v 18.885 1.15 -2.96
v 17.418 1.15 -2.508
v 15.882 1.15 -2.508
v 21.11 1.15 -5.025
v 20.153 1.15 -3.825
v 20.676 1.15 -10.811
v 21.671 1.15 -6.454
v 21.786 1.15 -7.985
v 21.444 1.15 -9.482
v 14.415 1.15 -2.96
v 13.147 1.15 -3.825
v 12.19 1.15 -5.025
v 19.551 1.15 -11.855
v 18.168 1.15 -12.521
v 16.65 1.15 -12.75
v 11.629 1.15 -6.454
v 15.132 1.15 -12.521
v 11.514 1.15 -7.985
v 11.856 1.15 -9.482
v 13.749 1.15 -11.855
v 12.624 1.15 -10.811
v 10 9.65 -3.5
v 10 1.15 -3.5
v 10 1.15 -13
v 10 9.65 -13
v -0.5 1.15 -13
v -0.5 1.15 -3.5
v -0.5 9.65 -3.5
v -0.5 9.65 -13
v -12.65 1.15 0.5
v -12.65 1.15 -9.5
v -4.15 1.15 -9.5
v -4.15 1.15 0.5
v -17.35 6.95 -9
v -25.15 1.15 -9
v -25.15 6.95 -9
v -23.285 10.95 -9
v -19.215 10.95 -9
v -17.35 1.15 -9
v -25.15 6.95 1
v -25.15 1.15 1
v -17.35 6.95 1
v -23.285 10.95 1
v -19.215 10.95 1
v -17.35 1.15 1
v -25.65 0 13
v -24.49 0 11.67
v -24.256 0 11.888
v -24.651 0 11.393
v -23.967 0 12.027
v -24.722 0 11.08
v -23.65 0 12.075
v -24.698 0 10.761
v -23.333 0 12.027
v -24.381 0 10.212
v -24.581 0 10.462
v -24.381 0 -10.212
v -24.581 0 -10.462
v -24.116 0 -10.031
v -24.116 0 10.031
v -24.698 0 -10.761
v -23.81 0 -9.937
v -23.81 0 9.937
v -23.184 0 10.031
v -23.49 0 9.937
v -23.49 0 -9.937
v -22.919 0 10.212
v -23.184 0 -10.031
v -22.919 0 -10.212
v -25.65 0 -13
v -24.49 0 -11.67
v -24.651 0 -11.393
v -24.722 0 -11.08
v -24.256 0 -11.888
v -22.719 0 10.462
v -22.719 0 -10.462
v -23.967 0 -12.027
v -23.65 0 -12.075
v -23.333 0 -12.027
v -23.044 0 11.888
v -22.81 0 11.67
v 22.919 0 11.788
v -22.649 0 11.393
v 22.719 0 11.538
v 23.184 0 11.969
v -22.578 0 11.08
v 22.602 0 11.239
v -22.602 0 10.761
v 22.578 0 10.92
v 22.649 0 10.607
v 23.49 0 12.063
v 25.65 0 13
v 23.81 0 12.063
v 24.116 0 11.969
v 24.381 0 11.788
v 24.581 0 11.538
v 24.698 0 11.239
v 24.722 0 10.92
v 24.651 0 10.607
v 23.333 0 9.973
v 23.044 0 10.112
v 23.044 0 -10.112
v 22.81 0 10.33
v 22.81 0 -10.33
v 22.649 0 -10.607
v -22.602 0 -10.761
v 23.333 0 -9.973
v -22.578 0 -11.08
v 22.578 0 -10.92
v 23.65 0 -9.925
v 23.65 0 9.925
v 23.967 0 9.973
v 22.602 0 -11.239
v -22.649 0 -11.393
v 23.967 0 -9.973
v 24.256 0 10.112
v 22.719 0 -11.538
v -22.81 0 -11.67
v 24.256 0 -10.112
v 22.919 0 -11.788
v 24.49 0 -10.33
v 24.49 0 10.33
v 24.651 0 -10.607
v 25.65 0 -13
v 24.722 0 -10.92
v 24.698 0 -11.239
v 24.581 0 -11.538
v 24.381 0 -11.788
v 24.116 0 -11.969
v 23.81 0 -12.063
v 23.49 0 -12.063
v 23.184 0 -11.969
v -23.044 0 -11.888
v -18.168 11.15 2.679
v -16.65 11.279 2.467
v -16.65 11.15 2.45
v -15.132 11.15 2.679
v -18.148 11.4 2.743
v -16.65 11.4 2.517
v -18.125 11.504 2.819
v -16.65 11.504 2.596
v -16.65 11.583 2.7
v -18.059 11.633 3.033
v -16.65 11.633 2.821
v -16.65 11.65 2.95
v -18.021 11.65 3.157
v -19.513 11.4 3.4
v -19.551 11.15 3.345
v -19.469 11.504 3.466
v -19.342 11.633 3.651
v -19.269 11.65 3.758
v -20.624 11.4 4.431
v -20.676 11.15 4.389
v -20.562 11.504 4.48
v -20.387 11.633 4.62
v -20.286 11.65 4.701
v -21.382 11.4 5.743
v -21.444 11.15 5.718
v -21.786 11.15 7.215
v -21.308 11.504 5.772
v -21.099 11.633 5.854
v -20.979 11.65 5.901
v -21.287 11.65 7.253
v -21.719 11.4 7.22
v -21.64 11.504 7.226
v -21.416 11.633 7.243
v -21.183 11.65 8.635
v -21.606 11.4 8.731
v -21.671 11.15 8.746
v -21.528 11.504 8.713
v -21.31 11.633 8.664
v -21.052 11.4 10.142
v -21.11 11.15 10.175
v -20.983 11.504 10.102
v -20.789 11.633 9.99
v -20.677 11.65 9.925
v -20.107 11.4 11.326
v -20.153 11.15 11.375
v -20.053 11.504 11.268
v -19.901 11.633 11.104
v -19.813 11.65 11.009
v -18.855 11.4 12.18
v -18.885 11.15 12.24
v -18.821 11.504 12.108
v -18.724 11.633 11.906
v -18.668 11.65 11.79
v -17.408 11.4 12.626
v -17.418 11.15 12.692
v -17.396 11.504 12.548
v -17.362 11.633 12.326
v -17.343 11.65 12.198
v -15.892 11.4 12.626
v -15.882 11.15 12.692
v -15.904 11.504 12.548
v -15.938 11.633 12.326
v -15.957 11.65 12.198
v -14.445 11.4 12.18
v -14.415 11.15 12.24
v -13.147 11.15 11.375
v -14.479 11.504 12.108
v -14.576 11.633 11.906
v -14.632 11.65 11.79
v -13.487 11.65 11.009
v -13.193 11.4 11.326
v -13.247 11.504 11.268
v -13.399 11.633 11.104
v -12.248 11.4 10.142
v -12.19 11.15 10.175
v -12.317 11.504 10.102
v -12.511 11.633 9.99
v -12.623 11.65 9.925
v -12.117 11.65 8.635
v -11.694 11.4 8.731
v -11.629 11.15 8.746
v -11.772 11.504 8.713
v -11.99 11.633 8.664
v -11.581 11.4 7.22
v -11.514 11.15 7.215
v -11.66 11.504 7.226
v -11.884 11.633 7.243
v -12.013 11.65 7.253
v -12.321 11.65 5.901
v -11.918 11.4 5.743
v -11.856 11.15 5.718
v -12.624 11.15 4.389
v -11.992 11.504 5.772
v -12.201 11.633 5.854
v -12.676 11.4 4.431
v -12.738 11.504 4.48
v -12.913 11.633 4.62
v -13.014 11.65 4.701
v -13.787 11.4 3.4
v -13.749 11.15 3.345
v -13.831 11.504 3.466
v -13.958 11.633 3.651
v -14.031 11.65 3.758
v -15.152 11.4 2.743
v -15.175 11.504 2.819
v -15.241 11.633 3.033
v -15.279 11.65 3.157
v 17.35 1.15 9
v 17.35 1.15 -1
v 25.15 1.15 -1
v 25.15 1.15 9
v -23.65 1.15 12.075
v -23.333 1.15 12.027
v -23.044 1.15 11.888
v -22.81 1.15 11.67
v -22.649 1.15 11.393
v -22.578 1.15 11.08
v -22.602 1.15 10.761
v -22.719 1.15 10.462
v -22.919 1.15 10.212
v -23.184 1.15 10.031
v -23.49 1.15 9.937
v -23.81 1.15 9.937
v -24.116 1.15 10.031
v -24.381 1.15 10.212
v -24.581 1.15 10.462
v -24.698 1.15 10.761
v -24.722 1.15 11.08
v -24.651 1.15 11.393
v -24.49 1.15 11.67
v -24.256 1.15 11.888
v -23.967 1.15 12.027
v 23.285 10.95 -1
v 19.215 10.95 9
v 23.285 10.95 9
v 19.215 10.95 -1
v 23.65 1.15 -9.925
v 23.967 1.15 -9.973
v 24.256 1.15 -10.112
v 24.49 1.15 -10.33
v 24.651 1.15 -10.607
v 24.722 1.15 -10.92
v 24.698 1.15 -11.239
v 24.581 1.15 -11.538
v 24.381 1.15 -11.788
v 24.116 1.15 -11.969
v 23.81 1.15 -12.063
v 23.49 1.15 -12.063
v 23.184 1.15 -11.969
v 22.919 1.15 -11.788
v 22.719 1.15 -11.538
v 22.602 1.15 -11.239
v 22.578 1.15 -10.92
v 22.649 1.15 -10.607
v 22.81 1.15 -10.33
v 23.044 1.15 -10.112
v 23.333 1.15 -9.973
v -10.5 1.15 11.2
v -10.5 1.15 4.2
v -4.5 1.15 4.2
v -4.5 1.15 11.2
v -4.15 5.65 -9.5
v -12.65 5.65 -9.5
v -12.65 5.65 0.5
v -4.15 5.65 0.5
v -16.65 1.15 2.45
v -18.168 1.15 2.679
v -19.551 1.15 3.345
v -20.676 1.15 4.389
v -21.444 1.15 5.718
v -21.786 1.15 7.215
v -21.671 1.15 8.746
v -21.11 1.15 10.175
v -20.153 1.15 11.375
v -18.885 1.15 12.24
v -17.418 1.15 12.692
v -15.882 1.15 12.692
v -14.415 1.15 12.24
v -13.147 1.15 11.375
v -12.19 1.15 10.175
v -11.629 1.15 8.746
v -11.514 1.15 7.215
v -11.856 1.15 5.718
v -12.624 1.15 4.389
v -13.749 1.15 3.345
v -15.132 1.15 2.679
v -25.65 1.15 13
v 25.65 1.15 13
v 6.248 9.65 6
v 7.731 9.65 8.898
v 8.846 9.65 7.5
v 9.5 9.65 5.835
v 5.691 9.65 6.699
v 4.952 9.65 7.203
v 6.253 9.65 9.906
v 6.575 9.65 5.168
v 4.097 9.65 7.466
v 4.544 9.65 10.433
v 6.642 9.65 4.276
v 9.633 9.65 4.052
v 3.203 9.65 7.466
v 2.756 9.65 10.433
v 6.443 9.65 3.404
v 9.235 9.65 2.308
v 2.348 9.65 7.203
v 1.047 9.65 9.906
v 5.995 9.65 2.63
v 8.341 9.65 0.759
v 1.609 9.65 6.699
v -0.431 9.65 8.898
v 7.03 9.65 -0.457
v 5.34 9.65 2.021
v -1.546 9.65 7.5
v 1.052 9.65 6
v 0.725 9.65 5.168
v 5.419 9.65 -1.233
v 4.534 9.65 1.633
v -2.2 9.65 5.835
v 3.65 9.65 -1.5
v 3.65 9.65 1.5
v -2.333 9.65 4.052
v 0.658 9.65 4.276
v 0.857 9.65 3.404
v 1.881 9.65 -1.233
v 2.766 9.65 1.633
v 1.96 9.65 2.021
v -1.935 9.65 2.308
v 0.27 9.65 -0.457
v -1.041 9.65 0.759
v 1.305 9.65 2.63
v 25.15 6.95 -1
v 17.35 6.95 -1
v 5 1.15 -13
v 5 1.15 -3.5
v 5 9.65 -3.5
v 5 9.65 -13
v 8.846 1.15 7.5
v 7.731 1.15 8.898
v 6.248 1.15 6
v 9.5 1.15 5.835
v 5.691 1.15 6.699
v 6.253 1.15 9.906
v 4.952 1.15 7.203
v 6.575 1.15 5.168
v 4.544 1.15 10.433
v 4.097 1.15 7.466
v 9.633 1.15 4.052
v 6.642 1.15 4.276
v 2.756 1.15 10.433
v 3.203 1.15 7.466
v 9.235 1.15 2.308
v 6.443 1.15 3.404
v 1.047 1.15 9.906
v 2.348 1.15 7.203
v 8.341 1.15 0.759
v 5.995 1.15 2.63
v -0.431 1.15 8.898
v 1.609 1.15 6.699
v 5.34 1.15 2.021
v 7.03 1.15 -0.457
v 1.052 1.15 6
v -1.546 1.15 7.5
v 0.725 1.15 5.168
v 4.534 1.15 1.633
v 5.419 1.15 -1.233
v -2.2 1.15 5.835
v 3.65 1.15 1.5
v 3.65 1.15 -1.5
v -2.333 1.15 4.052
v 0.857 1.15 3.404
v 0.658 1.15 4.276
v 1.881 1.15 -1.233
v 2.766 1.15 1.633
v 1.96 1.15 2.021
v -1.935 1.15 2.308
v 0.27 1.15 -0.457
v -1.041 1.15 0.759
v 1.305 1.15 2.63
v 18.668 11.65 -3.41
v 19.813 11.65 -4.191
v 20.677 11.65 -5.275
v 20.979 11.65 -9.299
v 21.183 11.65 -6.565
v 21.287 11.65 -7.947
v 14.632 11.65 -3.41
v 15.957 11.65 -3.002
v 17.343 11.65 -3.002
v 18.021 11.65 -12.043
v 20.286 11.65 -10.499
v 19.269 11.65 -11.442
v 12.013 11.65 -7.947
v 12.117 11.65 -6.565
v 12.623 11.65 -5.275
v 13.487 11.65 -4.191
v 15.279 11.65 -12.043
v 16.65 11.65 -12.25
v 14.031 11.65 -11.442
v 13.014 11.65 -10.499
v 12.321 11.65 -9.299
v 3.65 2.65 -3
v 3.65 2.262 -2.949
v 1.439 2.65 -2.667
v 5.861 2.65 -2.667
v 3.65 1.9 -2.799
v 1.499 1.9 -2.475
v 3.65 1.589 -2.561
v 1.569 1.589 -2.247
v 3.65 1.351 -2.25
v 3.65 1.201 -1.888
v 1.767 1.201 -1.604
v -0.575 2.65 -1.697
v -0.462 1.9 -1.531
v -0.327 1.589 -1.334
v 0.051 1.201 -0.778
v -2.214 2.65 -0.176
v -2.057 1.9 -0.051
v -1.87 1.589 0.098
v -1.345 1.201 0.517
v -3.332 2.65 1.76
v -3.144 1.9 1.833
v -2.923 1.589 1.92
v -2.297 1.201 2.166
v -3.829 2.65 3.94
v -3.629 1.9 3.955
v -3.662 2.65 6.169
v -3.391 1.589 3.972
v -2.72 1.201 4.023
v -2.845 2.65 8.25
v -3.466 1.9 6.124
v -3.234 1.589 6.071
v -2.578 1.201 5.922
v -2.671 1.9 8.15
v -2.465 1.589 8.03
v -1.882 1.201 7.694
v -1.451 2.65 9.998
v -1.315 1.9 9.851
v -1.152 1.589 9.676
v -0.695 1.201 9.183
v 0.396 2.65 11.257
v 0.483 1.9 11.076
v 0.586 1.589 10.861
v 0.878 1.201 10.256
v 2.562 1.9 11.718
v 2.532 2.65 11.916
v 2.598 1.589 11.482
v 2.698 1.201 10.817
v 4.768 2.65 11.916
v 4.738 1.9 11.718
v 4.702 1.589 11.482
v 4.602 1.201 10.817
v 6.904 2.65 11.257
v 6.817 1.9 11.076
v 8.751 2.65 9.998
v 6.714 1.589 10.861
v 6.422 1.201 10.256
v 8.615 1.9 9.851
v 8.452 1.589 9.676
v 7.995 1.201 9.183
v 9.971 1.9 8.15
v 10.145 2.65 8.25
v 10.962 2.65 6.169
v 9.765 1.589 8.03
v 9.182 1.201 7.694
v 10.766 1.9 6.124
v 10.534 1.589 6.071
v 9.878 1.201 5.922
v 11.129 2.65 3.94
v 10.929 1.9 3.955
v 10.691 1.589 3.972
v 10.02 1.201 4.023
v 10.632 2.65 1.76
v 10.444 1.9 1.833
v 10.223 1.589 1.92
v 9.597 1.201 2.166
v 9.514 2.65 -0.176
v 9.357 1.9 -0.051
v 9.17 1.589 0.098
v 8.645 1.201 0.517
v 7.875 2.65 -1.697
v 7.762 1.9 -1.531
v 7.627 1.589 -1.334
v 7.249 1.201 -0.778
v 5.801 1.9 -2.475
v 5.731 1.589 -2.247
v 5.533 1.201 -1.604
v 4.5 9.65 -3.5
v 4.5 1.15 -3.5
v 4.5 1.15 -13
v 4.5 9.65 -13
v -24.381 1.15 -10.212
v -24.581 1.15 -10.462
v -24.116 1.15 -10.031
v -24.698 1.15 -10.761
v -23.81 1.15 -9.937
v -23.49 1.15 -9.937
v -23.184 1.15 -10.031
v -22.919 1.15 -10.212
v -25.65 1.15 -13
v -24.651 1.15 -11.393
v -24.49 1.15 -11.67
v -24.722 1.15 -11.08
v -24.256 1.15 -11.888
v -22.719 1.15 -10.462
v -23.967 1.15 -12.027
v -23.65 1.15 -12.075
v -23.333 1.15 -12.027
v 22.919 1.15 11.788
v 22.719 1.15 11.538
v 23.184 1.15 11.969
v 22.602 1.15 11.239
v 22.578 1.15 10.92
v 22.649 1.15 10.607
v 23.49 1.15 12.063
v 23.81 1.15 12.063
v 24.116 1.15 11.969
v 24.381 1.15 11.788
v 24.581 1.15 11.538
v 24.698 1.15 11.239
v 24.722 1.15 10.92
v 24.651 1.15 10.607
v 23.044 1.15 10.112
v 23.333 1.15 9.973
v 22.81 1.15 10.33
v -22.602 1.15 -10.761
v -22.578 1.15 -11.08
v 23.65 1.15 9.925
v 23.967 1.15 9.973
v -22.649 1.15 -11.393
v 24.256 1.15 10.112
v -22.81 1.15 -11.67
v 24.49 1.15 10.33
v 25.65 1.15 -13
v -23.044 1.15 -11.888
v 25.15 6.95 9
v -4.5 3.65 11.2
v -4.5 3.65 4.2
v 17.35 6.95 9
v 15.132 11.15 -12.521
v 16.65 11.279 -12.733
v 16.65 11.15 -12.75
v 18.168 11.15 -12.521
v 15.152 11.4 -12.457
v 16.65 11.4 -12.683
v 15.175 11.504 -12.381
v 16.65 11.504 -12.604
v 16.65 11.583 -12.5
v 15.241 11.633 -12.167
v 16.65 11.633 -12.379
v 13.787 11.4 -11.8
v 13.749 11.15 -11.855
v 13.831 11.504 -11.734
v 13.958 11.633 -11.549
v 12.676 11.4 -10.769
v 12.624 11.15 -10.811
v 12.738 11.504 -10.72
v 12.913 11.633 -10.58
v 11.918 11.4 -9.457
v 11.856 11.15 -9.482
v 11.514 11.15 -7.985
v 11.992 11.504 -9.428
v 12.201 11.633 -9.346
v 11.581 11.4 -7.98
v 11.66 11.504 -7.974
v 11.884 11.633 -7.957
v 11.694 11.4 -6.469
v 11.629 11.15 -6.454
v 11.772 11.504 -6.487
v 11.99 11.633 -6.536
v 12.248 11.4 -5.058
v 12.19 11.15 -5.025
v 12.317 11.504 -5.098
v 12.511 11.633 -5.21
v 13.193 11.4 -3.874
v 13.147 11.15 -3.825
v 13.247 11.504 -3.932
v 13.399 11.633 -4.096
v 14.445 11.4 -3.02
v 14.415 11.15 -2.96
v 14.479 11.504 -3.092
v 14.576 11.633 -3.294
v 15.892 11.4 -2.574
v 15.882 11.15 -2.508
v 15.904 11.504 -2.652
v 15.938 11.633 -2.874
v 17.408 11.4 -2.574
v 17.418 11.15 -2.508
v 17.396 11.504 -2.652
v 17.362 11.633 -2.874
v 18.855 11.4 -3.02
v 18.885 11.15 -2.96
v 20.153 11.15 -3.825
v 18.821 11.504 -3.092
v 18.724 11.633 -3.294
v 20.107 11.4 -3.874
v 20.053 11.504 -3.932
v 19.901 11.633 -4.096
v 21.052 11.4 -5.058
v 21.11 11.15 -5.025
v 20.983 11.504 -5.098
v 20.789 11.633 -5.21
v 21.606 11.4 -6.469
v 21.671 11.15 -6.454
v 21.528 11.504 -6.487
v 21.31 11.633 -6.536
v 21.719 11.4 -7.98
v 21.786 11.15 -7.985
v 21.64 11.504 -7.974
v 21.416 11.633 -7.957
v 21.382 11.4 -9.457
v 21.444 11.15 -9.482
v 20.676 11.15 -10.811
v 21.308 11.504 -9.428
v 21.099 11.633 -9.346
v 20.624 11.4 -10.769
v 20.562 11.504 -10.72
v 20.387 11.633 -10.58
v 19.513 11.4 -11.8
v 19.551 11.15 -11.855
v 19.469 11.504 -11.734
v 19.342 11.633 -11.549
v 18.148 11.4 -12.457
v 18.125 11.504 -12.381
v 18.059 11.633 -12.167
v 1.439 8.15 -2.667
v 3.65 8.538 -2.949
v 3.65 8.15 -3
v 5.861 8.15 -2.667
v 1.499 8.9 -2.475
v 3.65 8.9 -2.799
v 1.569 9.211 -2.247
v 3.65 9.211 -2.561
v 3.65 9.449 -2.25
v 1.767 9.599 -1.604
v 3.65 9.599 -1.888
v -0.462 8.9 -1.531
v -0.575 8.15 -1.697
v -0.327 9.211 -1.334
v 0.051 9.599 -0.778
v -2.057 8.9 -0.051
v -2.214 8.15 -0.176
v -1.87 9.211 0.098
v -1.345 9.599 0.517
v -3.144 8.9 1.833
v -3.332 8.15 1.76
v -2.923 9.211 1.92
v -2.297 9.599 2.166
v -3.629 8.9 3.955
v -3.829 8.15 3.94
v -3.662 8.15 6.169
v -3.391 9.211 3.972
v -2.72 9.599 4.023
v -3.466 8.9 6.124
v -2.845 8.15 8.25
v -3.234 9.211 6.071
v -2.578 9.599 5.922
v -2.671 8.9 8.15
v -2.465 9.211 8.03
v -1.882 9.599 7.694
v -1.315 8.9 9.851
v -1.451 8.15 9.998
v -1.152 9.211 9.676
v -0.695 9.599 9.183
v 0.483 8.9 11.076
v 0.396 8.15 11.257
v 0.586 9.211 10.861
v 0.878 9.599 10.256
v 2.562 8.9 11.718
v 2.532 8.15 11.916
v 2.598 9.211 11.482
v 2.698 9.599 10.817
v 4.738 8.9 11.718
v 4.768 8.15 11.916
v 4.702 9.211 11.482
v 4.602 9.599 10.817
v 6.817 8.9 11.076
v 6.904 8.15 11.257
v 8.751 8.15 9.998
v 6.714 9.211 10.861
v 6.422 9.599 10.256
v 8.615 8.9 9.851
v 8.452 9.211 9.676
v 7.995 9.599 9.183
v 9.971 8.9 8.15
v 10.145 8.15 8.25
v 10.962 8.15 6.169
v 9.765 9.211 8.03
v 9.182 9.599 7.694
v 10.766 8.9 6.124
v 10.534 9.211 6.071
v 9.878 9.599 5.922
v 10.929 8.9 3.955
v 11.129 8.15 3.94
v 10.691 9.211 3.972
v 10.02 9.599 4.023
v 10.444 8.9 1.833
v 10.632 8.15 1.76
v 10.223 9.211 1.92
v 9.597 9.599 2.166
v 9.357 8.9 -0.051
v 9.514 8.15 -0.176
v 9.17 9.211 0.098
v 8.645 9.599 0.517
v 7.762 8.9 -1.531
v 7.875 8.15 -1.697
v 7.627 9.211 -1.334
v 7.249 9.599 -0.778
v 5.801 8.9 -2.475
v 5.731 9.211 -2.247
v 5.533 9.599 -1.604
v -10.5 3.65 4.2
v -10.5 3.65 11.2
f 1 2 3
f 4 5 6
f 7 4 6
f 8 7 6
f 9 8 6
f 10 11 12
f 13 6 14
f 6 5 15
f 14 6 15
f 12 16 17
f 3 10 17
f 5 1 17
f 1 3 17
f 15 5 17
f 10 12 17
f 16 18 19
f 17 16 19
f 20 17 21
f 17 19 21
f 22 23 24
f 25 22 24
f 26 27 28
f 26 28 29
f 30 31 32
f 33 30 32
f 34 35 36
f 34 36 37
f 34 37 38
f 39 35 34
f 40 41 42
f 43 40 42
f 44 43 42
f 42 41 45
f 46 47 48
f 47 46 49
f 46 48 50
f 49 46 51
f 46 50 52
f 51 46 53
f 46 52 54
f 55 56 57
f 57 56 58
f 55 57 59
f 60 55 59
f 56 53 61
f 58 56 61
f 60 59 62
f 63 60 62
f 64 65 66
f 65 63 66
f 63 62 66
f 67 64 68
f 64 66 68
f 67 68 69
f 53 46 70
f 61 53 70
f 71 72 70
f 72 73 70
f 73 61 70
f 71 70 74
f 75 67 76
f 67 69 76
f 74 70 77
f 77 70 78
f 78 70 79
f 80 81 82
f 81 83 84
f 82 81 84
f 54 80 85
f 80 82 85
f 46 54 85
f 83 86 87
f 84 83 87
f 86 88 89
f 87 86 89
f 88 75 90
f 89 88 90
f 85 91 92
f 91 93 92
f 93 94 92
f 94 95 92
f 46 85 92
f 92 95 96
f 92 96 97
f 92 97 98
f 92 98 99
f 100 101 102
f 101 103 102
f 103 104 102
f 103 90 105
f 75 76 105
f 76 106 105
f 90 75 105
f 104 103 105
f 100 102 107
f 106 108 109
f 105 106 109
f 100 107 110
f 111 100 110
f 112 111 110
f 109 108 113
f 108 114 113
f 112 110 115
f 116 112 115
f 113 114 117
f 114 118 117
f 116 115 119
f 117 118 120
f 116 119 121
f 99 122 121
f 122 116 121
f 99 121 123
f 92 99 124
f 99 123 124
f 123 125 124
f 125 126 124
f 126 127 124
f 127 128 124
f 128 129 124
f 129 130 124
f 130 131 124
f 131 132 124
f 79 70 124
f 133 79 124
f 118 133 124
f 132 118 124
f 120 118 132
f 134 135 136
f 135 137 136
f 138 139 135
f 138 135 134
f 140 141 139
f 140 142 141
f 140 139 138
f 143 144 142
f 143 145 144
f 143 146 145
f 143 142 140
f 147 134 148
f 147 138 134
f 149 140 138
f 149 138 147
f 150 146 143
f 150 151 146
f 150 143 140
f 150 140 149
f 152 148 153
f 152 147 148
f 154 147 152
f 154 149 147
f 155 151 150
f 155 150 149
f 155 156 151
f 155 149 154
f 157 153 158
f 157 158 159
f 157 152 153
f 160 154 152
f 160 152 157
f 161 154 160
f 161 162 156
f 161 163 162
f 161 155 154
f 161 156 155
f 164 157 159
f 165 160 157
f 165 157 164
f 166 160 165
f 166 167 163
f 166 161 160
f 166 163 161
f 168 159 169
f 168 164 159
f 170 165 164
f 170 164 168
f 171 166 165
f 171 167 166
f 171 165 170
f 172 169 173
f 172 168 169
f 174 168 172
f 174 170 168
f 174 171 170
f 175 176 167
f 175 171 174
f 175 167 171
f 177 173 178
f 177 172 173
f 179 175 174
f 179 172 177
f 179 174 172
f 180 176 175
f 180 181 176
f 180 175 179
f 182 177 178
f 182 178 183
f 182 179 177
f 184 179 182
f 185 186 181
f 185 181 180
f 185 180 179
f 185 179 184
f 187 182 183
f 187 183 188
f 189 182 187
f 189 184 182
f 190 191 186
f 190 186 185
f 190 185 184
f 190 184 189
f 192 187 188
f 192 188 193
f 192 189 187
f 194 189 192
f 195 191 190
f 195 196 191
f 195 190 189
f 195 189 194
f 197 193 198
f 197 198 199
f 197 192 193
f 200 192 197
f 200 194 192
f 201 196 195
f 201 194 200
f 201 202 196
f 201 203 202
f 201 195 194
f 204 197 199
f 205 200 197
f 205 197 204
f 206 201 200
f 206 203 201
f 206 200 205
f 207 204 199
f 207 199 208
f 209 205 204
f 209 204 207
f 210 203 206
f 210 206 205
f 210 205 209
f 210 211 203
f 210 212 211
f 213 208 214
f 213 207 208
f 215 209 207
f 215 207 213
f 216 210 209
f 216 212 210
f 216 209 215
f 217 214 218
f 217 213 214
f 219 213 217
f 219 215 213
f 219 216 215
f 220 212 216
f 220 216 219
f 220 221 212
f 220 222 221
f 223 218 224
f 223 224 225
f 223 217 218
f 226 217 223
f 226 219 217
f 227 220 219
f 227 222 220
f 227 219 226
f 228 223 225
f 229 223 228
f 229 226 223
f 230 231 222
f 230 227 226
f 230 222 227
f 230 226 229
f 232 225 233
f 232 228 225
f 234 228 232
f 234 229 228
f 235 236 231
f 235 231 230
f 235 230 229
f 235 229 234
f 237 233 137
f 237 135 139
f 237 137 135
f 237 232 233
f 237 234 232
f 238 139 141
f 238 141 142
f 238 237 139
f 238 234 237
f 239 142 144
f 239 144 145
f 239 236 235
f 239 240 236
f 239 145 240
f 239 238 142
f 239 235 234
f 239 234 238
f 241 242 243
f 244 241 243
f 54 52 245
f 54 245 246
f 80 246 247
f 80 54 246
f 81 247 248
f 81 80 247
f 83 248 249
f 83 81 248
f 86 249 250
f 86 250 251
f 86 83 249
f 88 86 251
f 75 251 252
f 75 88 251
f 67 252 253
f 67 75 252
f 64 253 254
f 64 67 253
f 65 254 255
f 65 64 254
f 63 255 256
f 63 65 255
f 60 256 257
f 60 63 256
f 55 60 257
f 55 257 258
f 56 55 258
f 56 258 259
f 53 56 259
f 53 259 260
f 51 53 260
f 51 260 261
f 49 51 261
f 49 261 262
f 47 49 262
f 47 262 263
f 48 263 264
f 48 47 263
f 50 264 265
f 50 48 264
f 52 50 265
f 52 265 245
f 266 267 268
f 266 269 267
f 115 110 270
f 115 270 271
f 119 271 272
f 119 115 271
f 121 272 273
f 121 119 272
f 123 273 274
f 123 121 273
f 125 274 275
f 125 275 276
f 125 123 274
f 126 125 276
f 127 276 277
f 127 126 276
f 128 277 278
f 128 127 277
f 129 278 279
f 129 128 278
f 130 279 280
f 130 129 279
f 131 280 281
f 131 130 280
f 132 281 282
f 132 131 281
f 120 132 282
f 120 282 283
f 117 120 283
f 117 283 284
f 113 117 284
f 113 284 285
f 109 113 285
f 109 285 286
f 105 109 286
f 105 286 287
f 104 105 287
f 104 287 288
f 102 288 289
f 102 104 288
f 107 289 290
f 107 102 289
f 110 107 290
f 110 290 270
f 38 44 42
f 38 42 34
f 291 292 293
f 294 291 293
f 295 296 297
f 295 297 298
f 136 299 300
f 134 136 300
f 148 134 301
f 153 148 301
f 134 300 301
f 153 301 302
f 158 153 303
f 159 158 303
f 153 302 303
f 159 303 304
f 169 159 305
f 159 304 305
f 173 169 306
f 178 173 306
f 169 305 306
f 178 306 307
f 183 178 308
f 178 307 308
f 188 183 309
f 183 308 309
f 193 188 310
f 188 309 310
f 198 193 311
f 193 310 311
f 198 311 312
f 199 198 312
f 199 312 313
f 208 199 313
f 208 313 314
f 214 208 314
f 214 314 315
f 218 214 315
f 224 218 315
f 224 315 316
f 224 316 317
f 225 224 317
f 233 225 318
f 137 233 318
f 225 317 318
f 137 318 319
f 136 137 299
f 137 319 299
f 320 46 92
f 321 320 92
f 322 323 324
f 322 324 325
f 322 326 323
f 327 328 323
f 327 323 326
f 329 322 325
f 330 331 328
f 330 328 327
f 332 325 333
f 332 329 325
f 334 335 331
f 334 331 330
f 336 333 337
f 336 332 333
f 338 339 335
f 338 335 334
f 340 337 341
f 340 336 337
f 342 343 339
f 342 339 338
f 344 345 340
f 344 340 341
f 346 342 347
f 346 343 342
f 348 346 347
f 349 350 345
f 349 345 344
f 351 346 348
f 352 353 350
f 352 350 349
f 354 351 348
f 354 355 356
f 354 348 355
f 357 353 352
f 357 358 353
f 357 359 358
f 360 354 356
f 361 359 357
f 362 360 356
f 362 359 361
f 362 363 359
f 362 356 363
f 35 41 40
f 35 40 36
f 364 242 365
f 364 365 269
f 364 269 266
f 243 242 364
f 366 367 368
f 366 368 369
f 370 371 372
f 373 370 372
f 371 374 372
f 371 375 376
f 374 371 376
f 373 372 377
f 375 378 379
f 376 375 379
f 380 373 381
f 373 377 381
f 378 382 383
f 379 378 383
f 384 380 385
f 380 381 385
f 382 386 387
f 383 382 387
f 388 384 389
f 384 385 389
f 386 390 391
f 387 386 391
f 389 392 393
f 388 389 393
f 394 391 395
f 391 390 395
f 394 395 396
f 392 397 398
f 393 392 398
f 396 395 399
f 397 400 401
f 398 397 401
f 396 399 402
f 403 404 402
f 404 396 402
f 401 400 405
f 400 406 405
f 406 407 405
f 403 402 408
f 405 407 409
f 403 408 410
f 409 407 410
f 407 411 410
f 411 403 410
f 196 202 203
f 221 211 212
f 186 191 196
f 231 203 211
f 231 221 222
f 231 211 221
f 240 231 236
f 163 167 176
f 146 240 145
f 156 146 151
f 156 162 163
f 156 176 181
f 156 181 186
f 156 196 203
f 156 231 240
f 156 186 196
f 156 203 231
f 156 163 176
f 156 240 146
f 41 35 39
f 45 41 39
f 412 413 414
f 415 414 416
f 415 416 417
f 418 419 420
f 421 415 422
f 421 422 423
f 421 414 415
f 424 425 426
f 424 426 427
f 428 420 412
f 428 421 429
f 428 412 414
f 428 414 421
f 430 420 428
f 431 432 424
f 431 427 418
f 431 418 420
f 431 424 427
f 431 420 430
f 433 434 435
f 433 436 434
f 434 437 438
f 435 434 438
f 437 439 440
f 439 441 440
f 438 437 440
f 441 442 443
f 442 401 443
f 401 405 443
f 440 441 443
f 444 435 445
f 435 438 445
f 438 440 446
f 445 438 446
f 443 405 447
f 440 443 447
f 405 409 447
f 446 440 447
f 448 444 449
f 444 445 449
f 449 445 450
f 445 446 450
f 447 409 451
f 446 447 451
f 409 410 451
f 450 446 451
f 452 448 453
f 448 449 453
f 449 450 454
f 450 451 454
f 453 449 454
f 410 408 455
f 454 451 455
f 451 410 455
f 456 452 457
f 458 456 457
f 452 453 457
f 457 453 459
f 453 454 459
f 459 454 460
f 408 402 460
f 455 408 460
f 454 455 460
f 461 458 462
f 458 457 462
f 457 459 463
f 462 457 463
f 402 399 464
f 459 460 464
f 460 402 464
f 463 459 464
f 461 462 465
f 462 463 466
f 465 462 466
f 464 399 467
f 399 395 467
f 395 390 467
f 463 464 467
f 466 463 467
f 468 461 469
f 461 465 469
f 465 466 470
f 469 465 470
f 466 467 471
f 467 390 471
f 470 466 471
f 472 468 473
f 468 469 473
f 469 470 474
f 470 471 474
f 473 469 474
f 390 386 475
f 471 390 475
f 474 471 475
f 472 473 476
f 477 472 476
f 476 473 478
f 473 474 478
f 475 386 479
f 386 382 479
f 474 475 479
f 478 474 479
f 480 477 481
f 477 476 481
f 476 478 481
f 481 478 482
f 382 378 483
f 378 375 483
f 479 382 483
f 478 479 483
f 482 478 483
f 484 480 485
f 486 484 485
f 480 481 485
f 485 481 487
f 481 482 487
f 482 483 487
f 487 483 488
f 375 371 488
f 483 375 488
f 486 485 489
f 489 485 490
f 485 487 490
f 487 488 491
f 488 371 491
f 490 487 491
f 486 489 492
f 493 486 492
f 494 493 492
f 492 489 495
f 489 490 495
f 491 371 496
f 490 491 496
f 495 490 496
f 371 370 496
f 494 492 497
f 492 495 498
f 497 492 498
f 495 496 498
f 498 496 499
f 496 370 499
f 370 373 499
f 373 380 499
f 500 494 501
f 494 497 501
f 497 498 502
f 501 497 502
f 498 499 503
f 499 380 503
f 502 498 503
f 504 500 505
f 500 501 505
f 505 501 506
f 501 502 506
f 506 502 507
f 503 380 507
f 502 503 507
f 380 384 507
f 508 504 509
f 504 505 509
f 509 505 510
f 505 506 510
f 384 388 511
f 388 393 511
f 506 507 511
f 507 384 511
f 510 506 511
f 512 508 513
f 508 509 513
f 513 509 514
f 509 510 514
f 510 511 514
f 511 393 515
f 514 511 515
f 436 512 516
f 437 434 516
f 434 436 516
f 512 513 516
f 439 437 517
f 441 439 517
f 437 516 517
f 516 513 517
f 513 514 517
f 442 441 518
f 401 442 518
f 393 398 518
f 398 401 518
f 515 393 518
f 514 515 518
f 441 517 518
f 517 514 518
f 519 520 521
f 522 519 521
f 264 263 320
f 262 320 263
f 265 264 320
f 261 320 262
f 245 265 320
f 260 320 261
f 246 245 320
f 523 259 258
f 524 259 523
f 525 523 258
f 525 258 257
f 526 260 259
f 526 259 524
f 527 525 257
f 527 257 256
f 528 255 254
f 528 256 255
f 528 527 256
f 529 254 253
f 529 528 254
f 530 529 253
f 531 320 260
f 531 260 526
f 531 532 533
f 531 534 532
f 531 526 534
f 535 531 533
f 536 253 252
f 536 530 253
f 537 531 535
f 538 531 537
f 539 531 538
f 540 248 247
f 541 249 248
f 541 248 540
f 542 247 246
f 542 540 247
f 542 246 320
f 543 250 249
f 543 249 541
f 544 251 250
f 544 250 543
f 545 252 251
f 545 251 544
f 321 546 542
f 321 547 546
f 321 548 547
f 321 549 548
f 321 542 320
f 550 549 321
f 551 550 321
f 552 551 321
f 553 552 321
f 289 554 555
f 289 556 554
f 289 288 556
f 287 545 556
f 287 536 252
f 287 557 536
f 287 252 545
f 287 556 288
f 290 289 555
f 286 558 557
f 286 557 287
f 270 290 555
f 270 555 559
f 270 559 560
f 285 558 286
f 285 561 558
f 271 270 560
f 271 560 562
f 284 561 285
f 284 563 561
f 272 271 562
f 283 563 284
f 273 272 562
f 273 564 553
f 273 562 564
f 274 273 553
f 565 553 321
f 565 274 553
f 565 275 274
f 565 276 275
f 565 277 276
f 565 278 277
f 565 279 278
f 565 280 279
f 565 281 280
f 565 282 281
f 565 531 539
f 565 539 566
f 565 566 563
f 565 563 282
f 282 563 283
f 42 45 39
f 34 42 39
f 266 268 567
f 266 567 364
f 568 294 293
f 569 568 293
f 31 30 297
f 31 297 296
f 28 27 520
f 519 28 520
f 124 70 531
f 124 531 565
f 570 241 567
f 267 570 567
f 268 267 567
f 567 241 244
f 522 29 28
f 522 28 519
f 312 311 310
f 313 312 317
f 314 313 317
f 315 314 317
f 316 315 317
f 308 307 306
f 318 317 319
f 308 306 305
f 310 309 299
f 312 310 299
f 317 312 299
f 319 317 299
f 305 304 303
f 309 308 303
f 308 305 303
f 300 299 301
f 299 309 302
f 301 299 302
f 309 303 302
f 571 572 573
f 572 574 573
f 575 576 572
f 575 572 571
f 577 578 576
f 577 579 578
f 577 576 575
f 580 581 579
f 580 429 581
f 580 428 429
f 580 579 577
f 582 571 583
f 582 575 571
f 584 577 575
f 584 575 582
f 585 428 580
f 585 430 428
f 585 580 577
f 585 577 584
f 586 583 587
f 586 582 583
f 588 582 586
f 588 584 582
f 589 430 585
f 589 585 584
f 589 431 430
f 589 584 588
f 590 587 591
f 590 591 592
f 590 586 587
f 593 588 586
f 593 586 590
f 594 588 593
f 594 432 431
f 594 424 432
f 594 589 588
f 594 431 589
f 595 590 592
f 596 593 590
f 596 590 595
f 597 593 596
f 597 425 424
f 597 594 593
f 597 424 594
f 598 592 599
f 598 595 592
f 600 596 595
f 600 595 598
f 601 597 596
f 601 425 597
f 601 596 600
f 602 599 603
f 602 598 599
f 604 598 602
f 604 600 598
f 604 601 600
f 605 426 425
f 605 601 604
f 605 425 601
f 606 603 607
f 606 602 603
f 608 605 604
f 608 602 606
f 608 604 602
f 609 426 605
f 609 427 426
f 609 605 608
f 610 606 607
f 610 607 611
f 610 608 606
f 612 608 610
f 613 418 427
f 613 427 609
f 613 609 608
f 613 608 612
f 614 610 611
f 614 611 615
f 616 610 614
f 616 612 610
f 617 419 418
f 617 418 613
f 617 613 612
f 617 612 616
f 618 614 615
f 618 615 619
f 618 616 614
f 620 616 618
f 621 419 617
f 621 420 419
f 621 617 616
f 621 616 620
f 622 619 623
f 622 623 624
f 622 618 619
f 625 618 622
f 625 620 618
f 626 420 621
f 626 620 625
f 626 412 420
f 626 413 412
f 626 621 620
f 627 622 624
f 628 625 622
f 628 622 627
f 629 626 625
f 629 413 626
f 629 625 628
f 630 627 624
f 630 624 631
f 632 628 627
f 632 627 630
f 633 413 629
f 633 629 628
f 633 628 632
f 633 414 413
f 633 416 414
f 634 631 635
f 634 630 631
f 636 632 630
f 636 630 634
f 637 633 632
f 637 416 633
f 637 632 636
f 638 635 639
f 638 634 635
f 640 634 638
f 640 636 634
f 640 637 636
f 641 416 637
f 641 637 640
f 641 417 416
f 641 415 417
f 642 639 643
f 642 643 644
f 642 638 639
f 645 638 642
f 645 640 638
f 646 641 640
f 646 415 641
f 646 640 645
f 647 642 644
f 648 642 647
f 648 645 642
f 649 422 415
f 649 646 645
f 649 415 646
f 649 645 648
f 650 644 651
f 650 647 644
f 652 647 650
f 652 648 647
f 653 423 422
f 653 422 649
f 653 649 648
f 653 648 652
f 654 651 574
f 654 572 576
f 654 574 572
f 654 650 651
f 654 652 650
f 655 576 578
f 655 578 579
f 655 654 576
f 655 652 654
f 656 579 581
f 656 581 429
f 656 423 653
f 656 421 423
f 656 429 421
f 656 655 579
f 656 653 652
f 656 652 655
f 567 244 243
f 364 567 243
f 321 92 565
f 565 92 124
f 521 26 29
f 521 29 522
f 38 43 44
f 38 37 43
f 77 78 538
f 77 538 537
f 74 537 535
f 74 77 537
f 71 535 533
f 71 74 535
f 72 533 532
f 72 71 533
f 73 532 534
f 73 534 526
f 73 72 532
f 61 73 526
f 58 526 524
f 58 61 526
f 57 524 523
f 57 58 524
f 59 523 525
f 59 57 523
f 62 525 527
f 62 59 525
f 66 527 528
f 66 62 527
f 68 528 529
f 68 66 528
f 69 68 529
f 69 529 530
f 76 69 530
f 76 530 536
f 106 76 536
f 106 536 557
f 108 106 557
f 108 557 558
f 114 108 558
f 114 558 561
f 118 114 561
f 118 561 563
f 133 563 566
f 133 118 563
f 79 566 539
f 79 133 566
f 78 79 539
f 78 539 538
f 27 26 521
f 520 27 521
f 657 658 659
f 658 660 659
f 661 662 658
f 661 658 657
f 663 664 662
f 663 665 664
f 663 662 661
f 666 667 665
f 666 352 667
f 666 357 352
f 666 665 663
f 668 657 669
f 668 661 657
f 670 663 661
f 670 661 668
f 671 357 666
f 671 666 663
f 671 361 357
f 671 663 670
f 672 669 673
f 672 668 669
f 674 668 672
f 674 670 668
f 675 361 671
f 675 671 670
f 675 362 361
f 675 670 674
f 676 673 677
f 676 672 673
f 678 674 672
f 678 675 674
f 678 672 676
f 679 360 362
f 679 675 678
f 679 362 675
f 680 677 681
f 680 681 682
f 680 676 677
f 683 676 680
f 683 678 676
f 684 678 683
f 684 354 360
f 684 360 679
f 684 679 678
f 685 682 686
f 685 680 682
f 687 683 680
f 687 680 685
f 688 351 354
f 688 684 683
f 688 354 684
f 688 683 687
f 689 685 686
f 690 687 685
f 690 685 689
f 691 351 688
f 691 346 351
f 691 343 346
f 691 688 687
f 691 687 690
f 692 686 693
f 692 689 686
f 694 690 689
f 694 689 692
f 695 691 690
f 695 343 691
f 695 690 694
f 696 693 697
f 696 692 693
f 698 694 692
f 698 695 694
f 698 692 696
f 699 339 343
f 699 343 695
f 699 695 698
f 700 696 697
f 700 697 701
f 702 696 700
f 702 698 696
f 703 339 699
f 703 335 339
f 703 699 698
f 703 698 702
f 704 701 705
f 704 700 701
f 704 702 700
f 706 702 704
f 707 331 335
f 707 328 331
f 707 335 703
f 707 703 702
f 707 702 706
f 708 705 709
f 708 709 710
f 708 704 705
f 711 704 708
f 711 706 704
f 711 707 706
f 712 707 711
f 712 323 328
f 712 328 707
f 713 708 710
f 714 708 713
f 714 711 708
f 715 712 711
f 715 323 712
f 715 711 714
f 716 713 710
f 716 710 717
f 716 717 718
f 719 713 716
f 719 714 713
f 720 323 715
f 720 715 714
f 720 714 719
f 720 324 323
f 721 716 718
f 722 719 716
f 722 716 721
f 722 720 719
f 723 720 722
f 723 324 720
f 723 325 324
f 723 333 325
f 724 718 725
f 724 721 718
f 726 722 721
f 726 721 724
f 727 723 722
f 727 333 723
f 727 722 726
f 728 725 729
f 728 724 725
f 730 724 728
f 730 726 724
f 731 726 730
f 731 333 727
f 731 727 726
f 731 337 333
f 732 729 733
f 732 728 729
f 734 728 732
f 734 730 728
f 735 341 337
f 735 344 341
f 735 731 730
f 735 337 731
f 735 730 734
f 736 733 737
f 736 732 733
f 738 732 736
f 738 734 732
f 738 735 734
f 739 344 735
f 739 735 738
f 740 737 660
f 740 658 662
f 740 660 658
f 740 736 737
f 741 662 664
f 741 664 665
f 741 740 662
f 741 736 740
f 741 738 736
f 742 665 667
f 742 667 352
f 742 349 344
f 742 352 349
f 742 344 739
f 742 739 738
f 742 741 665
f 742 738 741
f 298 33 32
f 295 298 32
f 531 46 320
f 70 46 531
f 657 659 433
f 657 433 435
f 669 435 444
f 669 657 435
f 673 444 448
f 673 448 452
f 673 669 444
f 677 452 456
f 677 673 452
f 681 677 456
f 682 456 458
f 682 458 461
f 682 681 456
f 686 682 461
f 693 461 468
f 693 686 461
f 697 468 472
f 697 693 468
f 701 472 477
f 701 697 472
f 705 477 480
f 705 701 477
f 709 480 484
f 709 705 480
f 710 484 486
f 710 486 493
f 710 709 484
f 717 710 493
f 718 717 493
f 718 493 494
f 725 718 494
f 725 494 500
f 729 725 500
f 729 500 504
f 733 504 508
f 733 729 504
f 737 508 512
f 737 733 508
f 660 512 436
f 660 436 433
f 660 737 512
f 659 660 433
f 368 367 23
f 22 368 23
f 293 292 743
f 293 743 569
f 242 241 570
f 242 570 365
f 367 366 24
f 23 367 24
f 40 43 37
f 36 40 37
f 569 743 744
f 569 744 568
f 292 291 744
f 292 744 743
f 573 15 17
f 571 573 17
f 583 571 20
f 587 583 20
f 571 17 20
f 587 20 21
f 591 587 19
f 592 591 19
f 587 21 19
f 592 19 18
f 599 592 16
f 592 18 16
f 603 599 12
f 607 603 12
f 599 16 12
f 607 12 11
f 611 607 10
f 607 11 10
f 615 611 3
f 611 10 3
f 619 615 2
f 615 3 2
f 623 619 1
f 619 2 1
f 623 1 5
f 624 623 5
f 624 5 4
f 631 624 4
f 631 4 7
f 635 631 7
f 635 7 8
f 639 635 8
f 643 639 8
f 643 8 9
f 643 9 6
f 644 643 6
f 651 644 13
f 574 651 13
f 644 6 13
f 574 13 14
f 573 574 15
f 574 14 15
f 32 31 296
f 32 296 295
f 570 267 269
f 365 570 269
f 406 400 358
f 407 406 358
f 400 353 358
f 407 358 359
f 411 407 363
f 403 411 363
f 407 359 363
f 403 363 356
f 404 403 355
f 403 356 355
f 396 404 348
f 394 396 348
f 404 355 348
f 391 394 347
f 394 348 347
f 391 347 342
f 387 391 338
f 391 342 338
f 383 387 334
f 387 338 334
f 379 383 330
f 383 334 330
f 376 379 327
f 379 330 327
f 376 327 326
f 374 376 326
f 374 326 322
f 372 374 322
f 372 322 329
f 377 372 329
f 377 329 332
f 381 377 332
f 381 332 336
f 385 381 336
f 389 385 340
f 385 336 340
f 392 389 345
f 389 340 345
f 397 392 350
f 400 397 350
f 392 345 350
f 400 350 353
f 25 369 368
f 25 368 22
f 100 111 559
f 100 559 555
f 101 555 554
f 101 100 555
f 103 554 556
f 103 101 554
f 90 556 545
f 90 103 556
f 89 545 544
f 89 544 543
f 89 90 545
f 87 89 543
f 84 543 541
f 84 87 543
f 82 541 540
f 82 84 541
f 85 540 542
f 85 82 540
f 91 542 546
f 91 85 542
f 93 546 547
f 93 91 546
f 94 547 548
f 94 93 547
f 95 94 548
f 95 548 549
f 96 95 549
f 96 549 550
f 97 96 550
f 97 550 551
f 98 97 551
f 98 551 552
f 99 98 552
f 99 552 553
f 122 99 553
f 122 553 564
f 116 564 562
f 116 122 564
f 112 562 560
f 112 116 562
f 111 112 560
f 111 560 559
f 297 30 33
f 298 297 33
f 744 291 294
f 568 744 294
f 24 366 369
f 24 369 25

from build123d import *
from OCP.BRepFilletAPI import BRepFilletAPI_MakeChamfer

# Parameters (mm, degrees)
CROQUIS1_W                = 51.3
CROQUIS1_H                = 26
CROQUIS1_R                = 1.075
SALIENTE_EXTRUIR1_DEPTH   = 1.15
CROQUIS2_R                = 5.15
SALIENTE_EXTRUIR2_DEPTH   = 10.5
SALIENTE_EXTRUIR2_2_DEPTH = 10.5
REDONDEO1_R               = 0.5
REDONDEO2_R               = 0.5
CROQUIS3_W                = 7.8
CROQUIS3_H                = 10
SALIENTE_EXTRUIR3_DEPTH   = 9.8
SALIENTE_EXTRUIR3_2_DEPTH = 9.8
CHAFL_N1_SIZE             = 4
CHAFL_N1_SIZE2            = 1.865230633
CHAFL_N2_SIZE             = 4
CHAFL_N2_SIZE2            = 1.865230633
CROQUIS5_W                = 5
CROQUIS5_H                = 9.5
SALIENTE_EXTRUIR4_DEPTH   = 8.5
SALIENTE_EXTRUIR4_2_DEPTH = 8.5
CROQUIS6_W                = 8.5
CROQUIS6_H                = 10
SALIENTE_EXTRUIR5_DEPTH   = 4.5
CROQUIS7_W                = 6
CROQUIS7_H                = 7
SALIENTE_EXTRUIR6_DEPTH   = 2.5
CROQUIS8_W                = 4.5
CROQUIS8_H                = 8.5
REDONDEO3_R               = 1.5


with BuildPart() as part:
    # Croquis1 → Saliente-Extruir1 (new body)
    with BuildSketch(Plane(origin=(0, 0, 0), x_dir=(1, 0, 0), z_dir=(0, 1, 0))):
        Rectangle(CROQUIS1_W, CROQUIS1_H)
        with Locations(Location((23.65, 11, 0), (0, 0, 270))):
            Circle(CROQUIS1_R, mode=Mode.SUBTRACT)
        with Locations(Location((23.65, -11, 0), (0, 0, 90))):
            Circle(CROQUIS1_R, mode=Mode.SUBTRACT)
        with Locations(Location((-23.65, -11, 0), (0, 0, 270))):
            Circle(CROQUIS1_R, mode=Mode.SUBTRACT)
        with Locations(Location((-23.65, 11, 0), (0, 0, 90))):
            Circle(CROQUIS1_R, mode=Mode.SUBTRACT)
    extrude(amount=SALIENTE_EXTRUIR1_DEPTH)


with BuildPart() as body_2:
    # Croquis2 → Saliente-Extruir2 (new body)
    with BuildSketch(Plane(origin=(0, 1.15, 0), x_dir=(1, 0, 0), z_dir=(0, 1, 0))):
        with Locations(Location((16.65, 7.6, 0), (0, 0, 90))):
            Circle(CROQUIS2_R)
    extrude(amount=SALIENTE_EXTRUIR2_DEPTH)

    # Redondeo2
    redondeo2_edges = [body_2.edges().sort_by_distance(p)[0] for p in [
        (16.65, 11.65, -2.45),
    ]]
    fillet(redondeo2_edges, radius=REDONDEO2_R)


with BuildPart() as body_3:
    # Croquis2 → Saliente-Extruir2 2 (new body)
    with BuildSketch(Plane(origin=(0, 1.15, 0), x_dir=(1, 0, 0), z_dir=(0, 1, 0))):
        with Locations(Location((-16.65, -7.6, 0), (0, 0, 90))):
            Circle(CROQUIS2_R)
    extrude(amount=SALIENTE_EXTRUIR2_2_DEPTH)

    # Redondeo1
    redondeo1_edges = [body_3.edges().sort_by_distance(p)[0] for p in [
        (-16.65, 11.65, 12.75),
    ]]
    fillet(redondeo1_edges, radius=REDONDEO1_R)


with BuildPart() as body_4:
    # Croquis3 → Saliente-Extruir3 (new body)
    with BuildSketch(Plane(origin=(0, 1.15, 0), x_dir=(1, 0, 0), z_dir=(0, 1, 0))):
        with Locations((21.25, -4)):
            Rectangle(CROQUIS3_W, CROQUIS3_H)
    extrude(amount=SALIENTE_EXTRUIR3_DEPTH)

    # Chaflán1: one chamfer whose edges measure the first distance from different faces: ONE call of the kernel's chamfer builder (chamfer() names one face for all edges)
    chafl_n1_edges_1 = [body_4.edges().sort_by_distance(p)[0] for p in [
        (25.15, 10.95, 4),
    ]]
    chafl_n1_side_1 = [body_4.faces().sort_by_distance(p)[0] for p in [
        (25.15, 6.05, 4),
    ]]
    chafl_n1_edges_2 = [body_4.edges().sort_by_distance(p)[0] for p in [
        (17.35, 10.95, 4),
    ]]
    chafl_n1_side_2 = [body_4.faces().sort_by_distance(p)[0] for p in [
        (17.35, 6.05, 4),
    ]]
    chafl_n1 = BRepFilletAPI_MakeChamfer(body_4.part.solid().wrapped)
    for e in chafl_n1_edges_1:
        chafl_n1.Add(CHAFL_N1_SIZE, CHAFL_N1_SIZE2, e.wrapped, chafl_n1_side_1[0].wrapped)  # the first distance lies on this face
    for e in chafl_n1_edges_2:
        chafl_n1.Add(CHAFL_N1_SIZE, CHAFL_N1_SIZE2, e.wrapped, chafl_n1_side_2[0].wrapped)  # the first distance lies on this face
    add(Compound.cast(chafl_n1.Shape()), mode=Mode.REPLACE)


with BuildPart() as body_5:
    # Croquis3 → Saliente-Extruir3 2 (new body)
    with BuildSketch(Plane(origin=(0, 1.15, 0), x_dir=(1, 0, 0), z_dir=(0, 1, 0))):
        with Locations((-21.25, 4)):
            Rectangle(CROQUIS3_W, CROQUIS3_H)
    extrude(amount=SALIENTE_EXTRUIR3_2_DEPTH)

    # Chaflán2: one chamfer whose edges measure the first distance from different faces: ONE call of the kernel's chamfer builder (chamfer() names one face for all edges)
    chafl_n2_edges_1 = [body_5.edges().sort_by_distance(p)[0] for p in [
        (-17.35, 10.95, -4),
    ]]
    chafl_n2_side_1 = [body_5.faces().sort_by_distance(p)[0] for p in [
        (-17.35, 6.05, -4),
    ]]
    chafl_n2_edges_2 = [body_5.edges().sort_by_distance(p)[0] for p in [
        (-25.15, 10.95, -4),
    ]]
    chafl_n2_side_2 = [body_5.faces().sort_by_distance(p)[0] for p in [
        (-25.15, 6.05, -4),
    ]]
    chafl_n2 = BRepFilletAPI_MakeChamfer(body_5.part.solid().wrapped)
    for e in chafl_n2_edges_1:
        chafl_n2.Add(CHAFL_N2_SIZE, CHAFL_N2_SIZE2, e.wrapped, chafl_n2_side_1[0].wrapped)  # the first distance lies on this face
    for e in chafl_n2_edges_2:
        chafl_n2.Add(CHAFL_N2_SIZE, CHAFL_N2_SIZE2, e.wrapped, chafl_n2_side_2[0].wrapped)  # the first distance lies on this face
    add(Compound.cast(chafl_n2.Shape()), mode=Mode.REPLACE)


with BuildPart() as body_6:
    # Croquis5 → Saliente-Extruir4 (new body)
    with BuildSketch(Plane(origin=(0, 1.15, 0), x_dir=(1, 0, 0), z_dir=(0, 1, 0))):
        with Locations((7.5, 8.25)):
            Rectangle(CROQUIS5_W, CROQUIS5_H)
    extrude(amount=SALIENTE_EXTRUIR4_DEPTH)


with BuildPart() as body_7:
    # Croquis5 → Saliente-Extruir4 2 (new body)
    with BuildSketch(Plane(origin=(0, 1.15, 0), x_dir=(1, 0, 0), z_dir=(0, 1, 0))):
        with Locations((2, 8.25)):
            Rectangle(CROQUIS5_W, CROQUIS5_H)
    extrude(amount=SALIENTE_EXTRUIR4_2_DEPTH)


with BuildPart() as body_8:
    # Croquis6 → Saliente-Extruir5 (new body)
    with BuildSketch(Plane(origin=(0, 1.15, 0), x_dir=(1, 0, 0), z_dir=(0, 1, 0))):
        with Locations((-8.4, 4.5)):
            Rectangle(CROQUIS6_W, CROQUIS6_H)
    extrude(amount=SALIENTE_EXTRUIR5_DEPTH)


with BuildPart() as body_9:
    # Croquis7 → Saliente-Extruir6 (new body)
    with BuildSketch(Plane(origin=(0, 1.15, 0), x_dir=(1, 0, 0), z_dir=(0, 1, 0))):
        with Locations((-7.5, -7.7)):
            Rectangle(CROQUIS7_W, CROQUIS7_H)
    extrude(amount=SALIENTE_EXTRUIR6_DEPTH)


with BuildPart() as body_10:
    # Croquis8 → Revolución1 (revolve)
    with BuildSketch(Plane(origin=(3.65, 0, 0), x_dir=(0, 0, -1), z_dir=(1, 0, 0)), mode=Mode.PRIVATE) as revoluci_n1_sk:
        with Locations((-9.75, 5.4)):
            Rectangle(CROQUIS8_W, CROQUIS8_H)
    revolve(revoluci_n1_sk.sketch.rotate(Axis((3.65, 1.15, 4.5), (0, 1, 0)), 180), axis=Axis((3.65, 1.15, 4.5), (0, 1, 0)))

    # Redondeo3
    redondeo3_edges = [body_10.edges().sort_by_distance(p)[0] for p in [
        (3.65, 9.65, 12),
        (3.65, 1.15, 12),
    ]]
    fillet(redondeo3_edges, radius=REDONDEO3_R)


solid = Compound([part.part, body_2.part, body_3.part, body_4.part, body_5.part, body_6.part, body_7.part, body_8.part, body_9.part, body_10.part])
